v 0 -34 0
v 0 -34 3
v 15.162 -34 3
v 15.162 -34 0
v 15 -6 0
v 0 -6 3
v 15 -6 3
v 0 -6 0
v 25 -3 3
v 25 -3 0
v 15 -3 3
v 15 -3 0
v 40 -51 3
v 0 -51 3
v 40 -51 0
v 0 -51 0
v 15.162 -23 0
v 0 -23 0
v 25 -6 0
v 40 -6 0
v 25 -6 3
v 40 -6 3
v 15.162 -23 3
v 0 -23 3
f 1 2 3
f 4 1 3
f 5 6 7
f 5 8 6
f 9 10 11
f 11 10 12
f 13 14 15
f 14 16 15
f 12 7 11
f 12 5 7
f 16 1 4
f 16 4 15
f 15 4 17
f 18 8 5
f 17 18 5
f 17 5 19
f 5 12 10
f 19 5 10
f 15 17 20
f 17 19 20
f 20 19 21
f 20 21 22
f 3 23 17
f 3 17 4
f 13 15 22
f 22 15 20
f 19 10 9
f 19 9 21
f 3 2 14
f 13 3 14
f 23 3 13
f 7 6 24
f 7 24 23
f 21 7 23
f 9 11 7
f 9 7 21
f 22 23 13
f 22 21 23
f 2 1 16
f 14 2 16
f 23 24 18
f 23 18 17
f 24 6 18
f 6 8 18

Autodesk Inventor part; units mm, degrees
ref_plane "YZ Plane" through (0, 0, 0) normal (1, 0, 0) x (0, 1, 0)
ref_plane "XZ Plane" through (0, 0, 0) normal (0, 1, 0) x (-1, 0, 0)
ref_plane "XY Plane" through (0, 0, 0) normal (0, 0, 1) x (1, 0, 0)
sketch "Boceto1" plane through (0, 0, 0) normal (0, 0, 1) x (1, 0, 0)
  line L0 (25, -3) -> (15, -3)
  line L1 (25, -3) -> (25, -6)
  line L2 (15, -6) -> (15, -3)
  line L3 (0, 0) -> (0, -3)
  line L4 (40, -6) -> (40, -3)
  line L5 (28.1623, -51) -> (8.1623, -51)
  line L6 (0, -6) -> (15, -6)
  line L7 (25, -6) -> (40, -6)
  line L8 (0, -6) -> (0, -51)
  line L9 (0, -51) -> (40, -51)
  line L10 (40, -51) -> (40, -6)
  line L11 (40, -6) -> (25, -6)
  line L12 (15, -6) -> (0, -6)
  point P0 (0, 0)
extrude "Extrusión1" add sketch "Boceto1" along normal blind 3
sketch "Boceto2" plane through (0, 0, 3) normal (0, 0, 1) x (1, 0, 0)
  line L0 (25, -6) -> (25, -3) projected
  line L1 (25, -3) -> (15, -3) projected
  line L2 (15, -3) -> (15, -6) projected
  line L3 (15, -6) -> (0, -6) projected
  line L4 (0, -6) -> (0, -51) projected
  line L5 (0, -51) -> (40, -51) projected
  line L6 (40, -51) -> (40, -6) projected
  line L7 (40, -6) -> (25, -6) projected
  line L8 (40, -51) -> (40, -6)
  line L9 (0, -51) -> (40, -51)
  line L10 (0, -6) -> (0, -51)
  line L11 (15, -6) -> (0, -6)
  line L12 (15, -3) -> (15, -6)
  line L13 (40, -6) -> (25, -6)
  line L14 (25, -6) -> (25, -3)
  line L15 (25, -3) -> (15, -3)
  line L16 (9.8382, -32) -> (1.6623, -32)
  line L17 (9.8382, -31) -> (1.6623, -31)
  line L18 (1.1623, 19) -> (1.1623, 20)
  line L19 (10.1623, -31) -> (10.1623, -32)
  line L20 (9.8382, -30) -> (1.6623, -30)
  line L21 (9.8382, -29) -> (1.6623, -29)
  line L22 (1.1623, 21) -> (1.1623, 22)
  line L23 (10.1623, -29) -> (10.1623, -30)
  line L24 (9.8382, -25) -> (1.6623, -25)
  line L25 (1.1623, 25) -> (1.1623, 26)
  line L26 (9.8382, -26) -> (9.8382, -25)
  line L27 (0, -34) -> (12.1623, -34)
  line L28 (12.1623, -34) -> (12.1623, -23)
  line L29 (12.1623, -23) -> (0, -23)
  line L30 (0, -23) -> (0, -34)
  point P0 (0, 0)
extrude "Extrusión2" cut sketch "Boceto2" against normal blind 3 contours L4 L29 L28 L27
sketch "Boceto3" plane through (0, 0, 3) normal (0, 0, 1) x (1, 0, 0)
  line L0 (12.1623, -34) -> (0, -34) projected
  line L1 (0, -34) -> (0, -51) projected
  line L2 (0, -51) -> (40, -51) projected
  line L3 (40, -51) -> (40, -6) projected
  line L4 (40, -6) -> (25, -6) projected
  line L5 (25, -6) -> (25, -3) projected
  line L6 (25, -3) -> (15, -3) projected
  line L7 (15, -3) -> (15, -6) projected
  line L8 (15, -6) -> (0, -6) projected
  line L9 (0, -6) -> (0, -23) projected
  line L10 (0, -23) -> (12.1623, -23) projected
  line L11 (12.1623, -23) -> (12.1623, -34) projected
  line L12 (12.1623, -34) -> (13.1623, -34)
  line L13 (13.1623, -34) -> (15.1623, -34)
  line L14 (15.1623, -34) -> (-10.6091, -34)
  line L15 (-10.6091, -34) -> (-10.6091, -23)
  line L16 (-10.6091, -23) -> (15.1623, -23)
  line L17 (15.1623, -23) -> (15.1623, -34)
  point P0 (0, 0)
  dimension "d4" = 1
  dimension "d5" = 2
extrude "Extrusión3" cut sketch "Boceto3" against normal blind 3 contours L0 L14 L15 L16 L10 L11 | L11 L16 L17 L13 L12
properties part number "acople 3" material "Madera (nogal)"
